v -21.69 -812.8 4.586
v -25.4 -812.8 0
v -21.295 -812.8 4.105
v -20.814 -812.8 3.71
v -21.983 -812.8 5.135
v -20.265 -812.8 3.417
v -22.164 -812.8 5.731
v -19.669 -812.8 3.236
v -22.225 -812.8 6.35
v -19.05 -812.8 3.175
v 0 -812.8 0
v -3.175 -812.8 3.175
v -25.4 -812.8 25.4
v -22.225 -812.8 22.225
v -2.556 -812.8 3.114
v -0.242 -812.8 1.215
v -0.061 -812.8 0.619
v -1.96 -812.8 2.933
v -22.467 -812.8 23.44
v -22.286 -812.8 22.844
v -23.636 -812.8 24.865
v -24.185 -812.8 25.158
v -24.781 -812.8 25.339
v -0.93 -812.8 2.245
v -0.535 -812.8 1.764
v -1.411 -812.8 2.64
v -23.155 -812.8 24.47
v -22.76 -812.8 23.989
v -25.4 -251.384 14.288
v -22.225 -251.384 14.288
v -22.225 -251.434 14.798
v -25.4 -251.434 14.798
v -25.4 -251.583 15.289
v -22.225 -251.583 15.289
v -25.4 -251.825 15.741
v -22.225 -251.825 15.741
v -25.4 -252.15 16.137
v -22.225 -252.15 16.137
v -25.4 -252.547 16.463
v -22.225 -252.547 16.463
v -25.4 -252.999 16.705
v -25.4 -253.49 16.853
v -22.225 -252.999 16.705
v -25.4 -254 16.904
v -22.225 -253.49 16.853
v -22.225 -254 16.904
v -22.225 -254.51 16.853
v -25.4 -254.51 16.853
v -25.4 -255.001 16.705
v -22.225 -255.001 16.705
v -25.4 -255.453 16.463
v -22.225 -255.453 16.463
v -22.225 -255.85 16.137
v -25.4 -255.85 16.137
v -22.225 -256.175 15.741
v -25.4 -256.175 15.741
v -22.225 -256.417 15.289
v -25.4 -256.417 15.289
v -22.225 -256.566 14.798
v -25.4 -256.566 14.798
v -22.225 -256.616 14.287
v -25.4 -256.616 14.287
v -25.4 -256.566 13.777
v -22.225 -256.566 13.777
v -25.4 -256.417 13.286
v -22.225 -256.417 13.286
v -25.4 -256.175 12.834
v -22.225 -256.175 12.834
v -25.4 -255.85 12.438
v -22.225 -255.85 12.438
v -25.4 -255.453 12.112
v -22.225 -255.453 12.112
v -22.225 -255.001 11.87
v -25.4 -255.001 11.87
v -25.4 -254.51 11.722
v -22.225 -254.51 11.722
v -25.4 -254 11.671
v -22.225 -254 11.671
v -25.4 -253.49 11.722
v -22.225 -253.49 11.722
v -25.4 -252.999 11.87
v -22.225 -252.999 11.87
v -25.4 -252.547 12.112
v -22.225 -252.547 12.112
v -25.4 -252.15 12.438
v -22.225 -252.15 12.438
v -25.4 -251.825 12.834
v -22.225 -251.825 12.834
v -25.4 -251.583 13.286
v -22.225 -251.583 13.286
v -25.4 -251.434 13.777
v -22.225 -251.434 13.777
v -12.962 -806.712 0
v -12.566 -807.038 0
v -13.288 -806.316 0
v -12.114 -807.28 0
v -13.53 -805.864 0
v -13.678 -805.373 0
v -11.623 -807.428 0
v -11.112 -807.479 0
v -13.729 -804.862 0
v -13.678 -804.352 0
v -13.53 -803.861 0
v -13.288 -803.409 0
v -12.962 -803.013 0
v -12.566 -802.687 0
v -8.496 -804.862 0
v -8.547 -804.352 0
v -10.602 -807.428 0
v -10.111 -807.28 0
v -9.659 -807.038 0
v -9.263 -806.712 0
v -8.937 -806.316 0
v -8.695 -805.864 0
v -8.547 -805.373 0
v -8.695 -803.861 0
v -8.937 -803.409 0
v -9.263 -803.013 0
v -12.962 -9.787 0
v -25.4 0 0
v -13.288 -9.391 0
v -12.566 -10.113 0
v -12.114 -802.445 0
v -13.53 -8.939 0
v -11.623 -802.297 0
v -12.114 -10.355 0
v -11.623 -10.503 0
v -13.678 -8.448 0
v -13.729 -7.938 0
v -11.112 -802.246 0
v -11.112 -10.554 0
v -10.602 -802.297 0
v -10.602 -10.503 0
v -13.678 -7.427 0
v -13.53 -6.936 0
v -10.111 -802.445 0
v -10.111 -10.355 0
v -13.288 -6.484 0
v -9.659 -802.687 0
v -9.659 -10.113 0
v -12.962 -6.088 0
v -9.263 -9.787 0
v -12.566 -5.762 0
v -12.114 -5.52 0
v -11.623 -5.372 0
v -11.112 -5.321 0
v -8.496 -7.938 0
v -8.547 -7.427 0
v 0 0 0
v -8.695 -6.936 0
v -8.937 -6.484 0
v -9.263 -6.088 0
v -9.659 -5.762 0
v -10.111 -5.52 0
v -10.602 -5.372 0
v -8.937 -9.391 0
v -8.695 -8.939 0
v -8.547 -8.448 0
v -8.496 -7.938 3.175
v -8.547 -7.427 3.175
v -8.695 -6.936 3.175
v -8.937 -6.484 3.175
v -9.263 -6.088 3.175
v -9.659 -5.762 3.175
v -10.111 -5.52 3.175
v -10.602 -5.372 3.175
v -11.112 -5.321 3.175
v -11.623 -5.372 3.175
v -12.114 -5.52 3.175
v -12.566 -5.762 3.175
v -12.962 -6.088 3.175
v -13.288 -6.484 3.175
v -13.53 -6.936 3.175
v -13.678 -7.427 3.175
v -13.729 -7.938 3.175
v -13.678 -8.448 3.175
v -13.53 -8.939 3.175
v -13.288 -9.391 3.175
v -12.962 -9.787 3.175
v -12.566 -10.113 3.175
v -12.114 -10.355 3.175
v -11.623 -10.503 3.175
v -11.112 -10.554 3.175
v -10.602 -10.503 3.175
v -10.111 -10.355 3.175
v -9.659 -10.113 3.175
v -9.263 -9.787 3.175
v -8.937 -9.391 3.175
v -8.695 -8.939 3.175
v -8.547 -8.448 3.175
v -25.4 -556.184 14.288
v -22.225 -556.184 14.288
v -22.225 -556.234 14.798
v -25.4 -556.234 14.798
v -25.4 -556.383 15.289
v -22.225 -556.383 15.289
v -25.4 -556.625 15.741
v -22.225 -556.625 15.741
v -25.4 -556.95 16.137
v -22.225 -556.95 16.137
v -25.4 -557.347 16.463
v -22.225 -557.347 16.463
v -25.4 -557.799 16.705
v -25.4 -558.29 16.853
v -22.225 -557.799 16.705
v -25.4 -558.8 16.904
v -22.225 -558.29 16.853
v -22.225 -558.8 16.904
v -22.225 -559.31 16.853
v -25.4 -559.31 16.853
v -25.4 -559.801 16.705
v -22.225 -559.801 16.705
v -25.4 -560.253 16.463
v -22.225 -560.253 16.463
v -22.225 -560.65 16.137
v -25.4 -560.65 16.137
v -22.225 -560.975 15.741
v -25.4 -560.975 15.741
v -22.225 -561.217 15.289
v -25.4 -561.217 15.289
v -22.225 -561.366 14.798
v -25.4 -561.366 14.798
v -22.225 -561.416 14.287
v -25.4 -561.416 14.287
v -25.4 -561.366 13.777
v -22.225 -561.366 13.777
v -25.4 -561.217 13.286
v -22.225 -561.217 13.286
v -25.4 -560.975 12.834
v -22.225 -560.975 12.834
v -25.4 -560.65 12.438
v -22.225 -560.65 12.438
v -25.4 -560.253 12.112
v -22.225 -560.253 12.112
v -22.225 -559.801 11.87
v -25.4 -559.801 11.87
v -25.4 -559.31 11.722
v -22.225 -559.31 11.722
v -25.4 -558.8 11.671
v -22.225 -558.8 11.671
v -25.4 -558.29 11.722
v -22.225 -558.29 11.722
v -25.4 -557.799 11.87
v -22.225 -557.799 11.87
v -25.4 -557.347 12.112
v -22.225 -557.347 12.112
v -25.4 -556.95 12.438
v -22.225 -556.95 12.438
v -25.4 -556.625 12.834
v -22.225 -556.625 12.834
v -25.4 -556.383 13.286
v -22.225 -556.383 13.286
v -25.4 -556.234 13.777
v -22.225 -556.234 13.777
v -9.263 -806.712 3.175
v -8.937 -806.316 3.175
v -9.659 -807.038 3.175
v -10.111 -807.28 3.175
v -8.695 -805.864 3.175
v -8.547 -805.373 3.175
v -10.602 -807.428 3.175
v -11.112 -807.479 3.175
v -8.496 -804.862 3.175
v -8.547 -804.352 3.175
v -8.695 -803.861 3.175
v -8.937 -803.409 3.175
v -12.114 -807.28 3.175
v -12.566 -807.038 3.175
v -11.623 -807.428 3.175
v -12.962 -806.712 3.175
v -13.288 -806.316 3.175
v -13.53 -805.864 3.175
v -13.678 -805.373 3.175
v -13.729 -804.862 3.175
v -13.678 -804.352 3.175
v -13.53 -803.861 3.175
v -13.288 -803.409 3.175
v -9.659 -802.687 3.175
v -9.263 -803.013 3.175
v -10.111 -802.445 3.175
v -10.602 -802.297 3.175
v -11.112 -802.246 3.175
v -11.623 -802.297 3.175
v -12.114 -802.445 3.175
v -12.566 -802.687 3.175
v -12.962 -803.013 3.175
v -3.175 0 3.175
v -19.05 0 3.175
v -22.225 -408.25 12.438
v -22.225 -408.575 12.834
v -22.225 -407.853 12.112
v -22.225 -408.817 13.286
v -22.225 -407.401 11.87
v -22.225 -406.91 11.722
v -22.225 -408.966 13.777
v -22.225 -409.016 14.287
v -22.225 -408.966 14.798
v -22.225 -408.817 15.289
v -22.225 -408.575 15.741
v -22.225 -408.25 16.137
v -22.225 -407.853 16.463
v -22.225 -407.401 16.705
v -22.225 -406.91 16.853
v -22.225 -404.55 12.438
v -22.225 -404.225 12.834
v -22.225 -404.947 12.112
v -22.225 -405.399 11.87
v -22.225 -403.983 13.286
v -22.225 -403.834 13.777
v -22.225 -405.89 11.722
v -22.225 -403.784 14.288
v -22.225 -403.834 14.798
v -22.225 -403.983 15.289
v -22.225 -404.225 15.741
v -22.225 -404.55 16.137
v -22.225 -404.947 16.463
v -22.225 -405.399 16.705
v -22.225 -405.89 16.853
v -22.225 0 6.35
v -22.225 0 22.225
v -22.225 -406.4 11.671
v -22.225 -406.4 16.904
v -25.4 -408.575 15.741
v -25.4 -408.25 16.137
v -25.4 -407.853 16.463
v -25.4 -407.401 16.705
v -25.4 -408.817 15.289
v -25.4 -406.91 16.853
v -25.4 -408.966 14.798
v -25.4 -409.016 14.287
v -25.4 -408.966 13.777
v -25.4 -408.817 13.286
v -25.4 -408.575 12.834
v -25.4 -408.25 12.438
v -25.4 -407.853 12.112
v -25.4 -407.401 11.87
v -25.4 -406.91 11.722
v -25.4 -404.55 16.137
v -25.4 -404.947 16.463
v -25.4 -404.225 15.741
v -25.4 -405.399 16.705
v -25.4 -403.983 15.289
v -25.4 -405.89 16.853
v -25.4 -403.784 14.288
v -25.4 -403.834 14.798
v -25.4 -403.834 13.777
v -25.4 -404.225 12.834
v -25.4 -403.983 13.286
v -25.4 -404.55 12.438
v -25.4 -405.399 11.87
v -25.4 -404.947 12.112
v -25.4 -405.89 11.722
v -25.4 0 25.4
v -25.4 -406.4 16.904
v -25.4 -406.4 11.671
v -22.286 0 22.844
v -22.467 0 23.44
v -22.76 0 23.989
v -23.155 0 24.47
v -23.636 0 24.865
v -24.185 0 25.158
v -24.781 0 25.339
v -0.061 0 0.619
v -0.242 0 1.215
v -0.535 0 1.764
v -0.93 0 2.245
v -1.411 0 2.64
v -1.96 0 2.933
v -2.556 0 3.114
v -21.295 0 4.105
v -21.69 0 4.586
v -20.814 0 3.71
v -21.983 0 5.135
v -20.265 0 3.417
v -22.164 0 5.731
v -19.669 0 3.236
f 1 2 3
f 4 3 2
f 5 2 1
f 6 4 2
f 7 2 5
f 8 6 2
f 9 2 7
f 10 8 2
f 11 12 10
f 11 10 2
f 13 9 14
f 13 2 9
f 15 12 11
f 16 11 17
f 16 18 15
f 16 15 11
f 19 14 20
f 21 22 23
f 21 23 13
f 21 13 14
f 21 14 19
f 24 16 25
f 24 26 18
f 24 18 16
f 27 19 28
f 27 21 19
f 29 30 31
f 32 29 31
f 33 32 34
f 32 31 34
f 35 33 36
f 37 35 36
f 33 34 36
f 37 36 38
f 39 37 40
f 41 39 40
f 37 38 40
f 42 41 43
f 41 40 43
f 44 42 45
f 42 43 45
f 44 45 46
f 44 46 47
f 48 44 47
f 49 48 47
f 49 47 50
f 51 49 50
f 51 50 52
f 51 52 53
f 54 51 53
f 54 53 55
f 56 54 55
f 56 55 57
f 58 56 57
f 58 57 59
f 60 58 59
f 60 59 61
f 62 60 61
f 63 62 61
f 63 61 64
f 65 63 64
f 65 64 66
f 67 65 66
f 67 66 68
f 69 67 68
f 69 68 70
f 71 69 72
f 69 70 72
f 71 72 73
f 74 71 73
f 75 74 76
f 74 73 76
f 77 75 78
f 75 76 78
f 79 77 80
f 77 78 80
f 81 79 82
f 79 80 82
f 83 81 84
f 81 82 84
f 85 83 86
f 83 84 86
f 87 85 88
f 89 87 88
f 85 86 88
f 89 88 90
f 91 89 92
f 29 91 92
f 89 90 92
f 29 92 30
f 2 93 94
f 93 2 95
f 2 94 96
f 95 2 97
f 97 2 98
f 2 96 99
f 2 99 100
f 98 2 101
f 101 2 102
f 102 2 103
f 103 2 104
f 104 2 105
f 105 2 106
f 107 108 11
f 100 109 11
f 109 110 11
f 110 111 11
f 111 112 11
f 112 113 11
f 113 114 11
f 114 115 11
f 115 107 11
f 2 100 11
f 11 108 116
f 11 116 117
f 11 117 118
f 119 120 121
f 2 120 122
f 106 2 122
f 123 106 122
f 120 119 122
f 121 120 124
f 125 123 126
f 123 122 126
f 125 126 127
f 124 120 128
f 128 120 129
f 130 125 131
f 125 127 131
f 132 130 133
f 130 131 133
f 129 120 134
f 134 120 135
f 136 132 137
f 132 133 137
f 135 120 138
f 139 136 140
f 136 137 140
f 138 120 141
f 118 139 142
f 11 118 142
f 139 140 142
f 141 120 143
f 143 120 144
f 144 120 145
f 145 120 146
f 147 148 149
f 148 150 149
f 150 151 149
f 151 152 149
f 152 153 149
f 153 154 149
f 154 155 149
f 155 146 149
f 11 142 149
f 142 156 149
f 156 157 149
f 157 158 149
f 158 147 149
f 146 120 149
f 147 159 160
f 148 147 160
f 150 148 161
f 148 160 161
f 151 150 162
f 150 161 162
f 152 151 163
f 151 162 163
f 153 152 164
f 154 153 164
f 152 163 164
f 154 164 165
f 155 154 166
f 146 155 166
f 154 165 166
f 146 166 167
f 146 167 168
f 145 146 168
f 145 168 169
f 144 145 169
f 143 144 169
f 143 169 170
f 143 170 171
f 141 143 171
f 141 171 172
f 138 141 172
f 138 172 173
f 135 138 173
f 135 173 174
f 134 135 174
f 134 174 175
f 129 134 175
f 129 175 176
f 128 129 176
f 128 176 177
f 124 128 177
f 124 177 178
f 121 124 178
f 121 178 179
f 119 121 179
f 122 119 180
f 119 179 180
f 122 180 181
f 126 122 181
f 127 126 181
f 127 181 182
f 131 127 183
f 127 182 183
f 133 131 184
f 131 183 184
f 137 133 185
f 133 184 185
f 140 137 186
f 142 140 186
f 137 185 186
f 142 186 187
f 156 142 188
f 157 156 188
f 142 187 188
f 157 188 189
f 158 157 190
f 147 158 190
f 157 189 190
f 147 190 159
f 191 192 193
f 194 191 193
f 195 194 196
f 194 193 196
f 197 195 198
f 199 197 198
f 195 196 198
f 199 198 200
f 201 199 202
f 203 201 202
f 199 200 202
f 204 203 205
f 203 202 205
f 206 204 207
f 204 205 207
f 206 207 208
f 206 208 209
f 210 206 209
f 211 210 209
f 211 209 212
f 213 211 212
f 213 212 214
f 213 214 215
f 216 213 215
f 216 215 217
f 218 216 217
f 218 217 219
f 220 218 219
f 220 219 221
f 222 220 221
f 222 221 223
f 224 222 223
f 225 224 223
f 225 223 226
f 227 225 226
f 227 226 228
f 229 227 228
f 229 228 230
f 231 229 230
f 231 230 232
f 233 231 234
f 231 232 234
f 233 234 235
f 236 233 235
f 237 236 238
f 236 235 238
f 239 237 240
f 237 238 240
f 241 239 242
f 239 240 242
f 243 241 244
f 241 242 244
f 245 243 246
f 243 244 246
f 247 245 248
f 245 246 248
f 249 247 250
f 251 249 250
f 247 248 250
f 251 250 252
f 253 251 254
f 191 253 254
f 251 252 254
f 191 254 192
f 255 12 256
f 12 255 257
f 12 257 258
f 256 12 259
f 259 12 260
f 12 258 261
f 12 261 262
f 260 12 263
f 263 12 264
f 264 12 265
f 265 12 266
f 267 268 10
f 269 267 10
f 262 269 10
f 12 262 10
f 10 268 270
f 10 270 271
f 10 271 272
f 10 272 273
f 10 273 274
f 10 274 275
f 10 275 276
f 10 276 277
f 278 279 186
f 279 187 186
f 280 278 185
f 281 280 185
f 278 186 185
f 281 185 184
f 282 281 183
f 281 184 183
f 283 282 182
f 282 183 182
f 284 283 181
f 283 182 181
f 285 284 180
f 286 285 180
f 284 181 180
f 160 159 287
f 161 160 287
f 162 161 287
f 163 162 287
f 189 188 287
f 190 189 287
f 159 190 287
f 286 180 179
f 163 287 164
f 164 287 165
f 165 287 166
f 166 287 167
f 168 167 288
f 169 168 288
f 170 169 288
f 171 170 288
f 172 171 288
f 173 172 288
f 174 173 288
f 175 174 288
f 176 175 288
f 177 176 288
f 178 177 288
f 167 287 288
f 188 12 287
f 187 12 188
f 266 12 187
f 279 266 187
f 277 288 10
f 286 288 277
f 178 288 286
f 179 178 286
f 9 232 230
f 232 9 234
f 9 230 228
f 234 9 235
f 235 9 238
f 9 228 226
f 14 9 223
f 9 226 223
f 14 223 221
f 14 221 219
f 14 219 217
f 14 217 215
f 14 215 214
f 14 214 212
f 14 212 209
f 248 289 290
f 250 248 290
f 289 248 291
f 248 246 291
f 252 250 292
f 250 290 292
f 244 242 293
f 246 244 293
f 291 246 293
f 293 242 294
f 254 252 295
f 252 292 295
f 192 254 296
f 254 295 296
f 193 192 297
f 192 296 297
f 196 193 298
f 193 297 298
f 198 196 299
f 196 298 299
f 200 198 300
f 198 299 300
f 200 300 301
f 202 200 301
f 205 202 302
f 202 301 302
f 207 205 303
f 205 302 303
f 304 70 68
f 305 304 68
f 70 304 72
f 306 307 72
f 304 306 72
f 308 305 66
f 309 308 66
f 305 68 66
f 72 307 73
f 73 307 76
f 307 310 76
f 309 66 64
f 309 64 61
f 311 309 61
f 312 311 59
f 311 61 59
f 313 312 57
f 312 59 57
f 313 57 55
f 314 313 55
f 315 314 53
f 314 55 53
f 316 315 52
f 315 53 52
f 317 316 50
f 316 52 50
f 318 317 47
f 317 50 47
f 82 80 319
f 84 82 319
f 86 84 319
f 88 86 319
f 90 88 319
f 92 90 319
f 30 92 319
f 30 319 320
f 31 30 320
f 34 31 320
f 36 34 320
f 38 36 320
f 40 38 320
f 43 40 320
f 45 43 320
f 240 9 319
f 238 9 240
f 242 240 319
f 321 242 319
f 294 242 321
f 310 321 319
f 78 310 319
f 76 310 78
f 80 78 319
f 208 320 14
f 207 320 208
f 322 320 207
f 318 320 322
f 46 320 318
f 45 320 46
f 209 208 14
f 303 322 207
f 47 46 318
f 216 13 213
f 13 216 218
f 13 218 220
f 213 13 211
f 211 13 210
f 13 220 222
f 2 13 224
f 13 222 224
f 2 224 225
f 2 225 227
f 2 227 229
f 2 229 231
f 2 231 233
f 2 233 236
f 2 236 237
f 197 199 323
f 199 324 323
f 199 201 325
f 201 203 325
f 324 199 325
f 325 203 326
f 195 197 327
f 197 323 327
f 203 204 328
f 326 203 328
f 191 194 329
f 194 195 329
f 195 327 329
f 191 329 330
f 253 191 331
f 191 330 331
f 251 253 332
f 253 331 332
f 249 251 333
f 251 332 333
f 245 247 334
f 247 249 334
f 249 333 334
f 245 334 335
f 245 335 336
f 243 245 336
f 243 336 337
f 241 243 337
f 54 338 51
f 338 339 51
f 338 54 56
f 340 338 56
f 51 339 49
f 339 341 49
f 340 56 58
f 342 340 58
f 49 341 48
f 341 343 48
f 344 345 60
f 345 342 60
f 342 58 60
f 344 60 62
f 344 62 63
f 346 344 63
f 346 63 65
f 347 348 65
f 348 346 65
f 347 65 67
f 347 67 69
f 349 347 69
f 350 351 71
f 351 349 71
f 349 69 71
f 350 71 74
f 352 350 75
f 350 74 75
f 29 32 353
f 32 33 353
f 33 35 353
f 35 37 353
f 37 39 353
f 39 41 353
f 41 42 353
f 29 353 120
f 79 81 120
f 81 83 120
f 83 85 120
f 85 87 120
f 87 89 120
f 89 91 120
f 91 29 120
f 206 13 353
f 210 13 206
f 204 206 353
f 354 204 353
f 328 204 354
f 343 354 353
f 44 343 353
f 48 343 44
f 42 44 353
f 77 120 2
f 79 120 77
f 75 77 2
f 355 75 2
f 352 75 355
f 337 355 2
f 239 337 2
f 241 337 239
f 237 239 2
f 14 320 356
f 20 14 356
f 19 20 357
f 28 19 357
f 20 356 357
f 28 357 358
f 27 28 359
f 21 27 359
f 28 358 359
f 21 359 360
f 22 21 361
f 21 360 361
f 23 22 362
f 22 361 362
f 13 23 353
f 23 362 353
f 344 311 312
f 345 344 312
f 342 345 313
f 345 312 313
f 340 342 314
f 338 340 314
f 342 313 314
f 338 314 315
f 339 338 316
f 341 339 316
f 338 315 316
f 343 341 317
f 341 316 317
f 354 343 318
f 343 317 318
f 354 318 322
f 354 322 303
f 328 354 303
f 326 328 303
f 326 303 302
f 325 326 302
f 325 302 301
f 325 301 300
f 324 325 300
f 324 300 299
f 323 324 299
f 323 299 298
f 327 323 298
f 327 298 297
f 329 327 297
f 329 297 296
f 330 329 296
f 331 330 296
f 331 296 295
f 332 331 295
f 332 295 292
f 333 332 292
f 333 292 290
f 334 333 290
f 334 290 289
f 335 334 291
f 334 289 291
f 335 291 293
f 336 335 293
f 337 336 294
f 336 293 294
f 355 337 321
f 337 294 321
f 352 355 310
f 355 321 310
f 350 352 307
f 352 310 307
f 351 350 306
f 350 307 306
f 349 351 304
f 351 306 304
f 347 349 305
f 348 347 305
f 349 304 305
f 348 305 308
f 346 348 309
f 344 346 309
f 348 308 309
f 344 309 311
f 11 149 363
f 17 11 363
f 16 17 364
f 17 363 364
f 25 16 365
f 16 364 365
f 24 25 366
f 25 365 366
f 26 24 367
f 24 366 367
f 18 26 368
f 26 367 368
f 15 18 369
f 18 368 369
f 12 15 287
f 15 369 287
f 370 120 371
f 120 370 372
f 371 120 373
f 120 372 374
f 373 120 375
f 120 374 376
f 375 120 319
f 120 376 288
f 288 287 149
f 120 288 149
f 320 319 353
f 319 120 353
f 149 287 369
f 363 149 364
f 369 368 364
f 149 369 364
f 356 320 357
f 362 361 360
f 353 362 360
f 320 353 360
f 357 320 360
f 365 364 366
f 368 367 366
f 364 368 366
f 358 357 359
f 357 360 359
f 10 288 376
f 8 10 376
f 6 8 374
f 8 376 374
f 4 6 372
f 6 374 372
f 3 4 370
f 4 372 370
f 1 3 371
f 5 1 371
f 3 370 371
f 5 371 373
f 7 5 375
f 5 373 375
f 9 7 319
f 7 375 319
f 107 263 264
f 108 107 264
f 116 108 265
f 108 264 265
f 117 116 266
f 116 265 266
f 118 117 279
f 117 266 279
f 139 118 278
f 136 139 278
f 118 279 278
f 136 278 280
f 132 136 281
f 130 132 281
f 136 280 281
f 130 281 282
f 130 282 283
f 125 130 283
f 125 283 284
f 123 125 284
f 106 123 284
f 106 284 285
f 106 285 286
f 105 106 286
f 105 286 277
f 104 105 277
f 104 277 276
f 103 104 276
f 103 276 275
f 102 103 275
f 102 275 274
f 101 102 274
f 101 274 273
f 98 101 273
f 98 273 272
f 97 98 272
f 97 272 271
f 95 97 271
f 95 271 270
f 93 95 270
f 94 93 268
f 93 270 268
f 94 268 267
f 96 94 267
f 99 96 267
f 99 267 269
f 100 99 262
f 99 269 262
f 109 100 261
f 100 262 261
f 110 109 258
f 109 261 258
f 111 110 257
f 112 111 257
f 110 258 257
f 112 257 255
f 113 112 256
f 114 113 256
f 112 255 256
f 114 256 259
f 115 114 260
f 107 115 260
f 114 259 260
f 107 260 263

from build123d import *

# Parameters (mm, degrees)
F1_DEPTH = 812.8
F2_R     = 2.6162
F3_DEPTH = 3.176
F4_R     = 2.6162
F5_DEPTH = 3.176


with BuildPart() as f1:
    # F0 (on Front) → F1 (new body)
    with BuildSketch(Plane.XZ):
        with BuildLine():
            Line((-25.4, 0), (0, 0))
            ThreePointArc((0, 0), (-0.929936, 2.245064), (-3.175, 3.175))
            Line((-3.175, 3.175), (-19.05, 3.175))
            ThreePointArc((-19.05, 3.175), (-21.295064, 4.104936), (-22.225, 6.35))
            Line((-22.225, 6.35), (-22.225, 22.225))
            ThreePointArc((-22.225, 22.225), (-23.154936, 24.470064), (-25.4, 25.4))
            Line((-25.4, 25.4), (-25.4, 0))
        make_face()
    extrude(amount=F1_DEPTH)

    # F2 (on face) → F3 (cut, through all)
    with BuildSketch(Plane.YZ.offset(-22.225)):
        with Locations((-558.8, 14.2875)):
            Circle(F2_R)
        with Locations((-406.4, 14.2875)):
            Circle(F2_R)
        with Locations((-254, 14.2875)):
            Circle(F2_R)
    extrude(amount=-F3_DEPTH, mode=Mode.SUBTRACT)

    # F4 (on face) → F5 (cut, through all)
    with BuildSketch(Plane.XY.offset(3.175)):
        with Locations((-11.1125, -804.8625)):
            Circle(F4_R)
        with Locations((-11.1125, -7.9375)):
            Circle(F4_R)
    extrude(amount=-F5_DEPTH, mode=Mode.SUBTRACT)


solid = f1.part
